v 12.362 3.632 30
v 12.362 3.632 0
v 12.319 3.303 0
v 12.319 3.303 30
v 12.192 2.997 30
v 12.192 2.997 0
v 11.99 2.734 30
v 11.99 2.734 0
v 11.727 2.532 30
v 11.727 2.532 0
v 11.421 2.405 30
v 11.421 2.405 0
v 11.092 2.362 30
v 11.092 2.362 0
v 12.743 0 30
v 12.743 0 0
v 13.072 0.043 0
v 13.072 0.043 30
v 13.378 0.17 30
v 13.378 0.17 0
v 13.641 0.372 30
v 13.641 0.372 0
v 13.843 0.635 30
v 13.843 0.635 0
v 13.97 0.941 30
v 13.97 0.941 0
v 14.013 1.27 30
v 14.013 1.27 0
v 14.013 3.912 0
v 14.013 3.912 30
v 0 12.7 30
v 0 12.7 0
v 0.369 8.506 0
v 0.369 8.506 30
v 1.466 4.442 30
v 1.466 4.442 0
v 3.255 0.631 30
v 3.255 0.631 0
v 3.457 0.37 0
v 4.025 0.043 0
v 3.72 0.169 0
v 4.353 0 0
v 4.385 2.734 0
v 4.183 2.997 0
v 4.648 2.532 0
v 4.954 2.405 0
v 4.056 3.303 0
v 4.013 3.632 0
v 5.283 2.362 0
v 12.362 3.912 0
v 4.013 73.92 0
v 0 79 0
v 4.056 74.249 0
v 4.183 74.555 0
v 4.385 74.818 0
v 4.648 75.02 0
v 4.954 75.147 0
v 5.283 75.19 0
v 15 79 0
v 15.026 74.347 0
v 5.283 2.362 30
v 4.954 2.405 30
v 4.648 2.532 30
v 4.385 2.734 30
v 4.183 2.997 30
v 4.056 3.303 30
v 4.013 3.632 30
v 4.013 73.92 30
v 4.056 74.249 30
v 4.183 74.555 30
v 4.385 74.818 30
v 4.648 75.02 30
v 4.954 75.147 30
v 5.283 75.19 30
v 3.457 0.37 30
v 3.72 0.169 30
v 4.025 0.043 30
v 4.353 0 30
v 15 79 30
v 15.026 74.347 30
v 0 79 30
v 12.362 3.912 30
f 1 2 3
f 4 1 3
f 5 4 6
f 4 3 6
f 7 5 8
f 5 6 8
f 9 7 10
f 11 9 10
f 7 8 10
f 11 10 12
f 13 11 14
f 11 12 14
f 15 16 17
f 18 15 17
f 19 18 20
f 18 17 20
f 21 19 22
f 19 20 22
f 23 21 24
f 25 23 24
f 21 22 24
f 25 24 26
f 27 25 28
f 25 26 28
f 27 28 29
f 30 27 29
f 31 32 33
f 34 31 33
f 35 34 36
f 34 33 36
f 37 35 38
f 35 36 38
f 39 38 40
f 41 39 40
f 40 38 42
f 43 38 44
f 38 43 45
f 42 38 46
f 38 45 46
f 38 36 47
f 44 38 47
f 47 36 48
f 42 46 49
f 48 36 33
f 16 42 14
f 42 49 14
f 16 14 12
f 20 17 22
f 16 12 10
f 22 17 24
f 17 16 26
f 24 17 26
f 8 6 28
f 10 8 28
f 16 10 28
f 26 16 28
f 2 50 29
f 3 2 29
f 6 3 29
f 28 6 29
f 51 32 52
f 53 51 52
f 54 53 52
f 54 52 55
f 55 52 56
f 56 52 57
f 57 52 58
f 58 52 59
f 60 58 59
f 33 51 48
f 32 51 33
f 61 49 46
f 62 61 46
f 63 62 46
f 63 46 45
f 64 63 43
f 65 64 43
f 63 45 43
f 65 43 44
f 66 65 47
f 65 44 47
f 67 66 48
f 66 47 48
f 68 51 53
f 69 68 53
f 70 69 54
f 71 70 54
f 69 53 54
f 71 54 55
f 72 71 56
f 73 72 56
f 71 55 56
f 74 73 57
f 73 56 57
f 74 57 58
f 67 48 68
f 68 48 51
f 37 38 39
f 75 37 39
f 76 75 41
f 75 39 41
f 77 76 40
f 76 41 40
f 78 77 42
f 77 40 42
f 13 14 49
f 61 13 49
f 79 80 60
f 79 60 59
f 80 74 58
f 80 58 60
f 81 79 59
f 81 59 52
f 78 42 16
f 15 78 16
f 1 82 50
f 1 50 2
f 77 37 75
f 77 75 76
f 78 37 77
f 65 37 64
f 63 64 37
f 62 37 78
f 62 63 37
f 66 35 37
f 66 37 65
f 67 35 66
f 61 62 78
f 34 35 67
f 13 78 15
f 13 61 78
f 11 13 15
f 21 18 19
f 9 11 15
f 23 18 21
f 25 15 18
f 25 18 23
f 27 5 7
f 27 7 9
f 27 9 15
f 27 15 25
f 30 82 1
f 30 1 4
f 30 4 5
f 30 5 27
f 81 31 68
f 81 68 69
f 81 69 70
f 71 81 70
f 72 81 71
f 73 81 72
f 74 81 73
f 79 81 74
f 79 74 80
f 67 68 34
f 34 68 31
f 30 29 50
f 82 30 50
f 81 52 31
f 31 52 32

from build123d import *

# Parameters (mm, degrees)
F1_DEPTH = 30


# Not quite as in the source:
# - a feature names something its author has since deleted; it is built from what else it names


with BuildPart() as f1:
    # F0 (on Top) → F1 (new body)
    with BuildSketch(Plane.XY):
        with BuildLine():
            Line((15.0259537622, 74.3470937014), (15, 79))
            Line((15, 79), (0, 79))
            Line((0, 79), (0, 12.7))
            ThreePointArc((0, 12.7), (0.8280772268, 6.4500404007), (3.2551662494, 0.6313682358))
            ThreePointArc((3.2551662494, 0.6313682358), (3.719732188, 0.1690998364), (4.352913702, 0))
            Line((4.352913702, 0), (12.7432, 0))
            ThreePointArc((12.7432, 0), (13.6412256121, 0.3719743879), (14.0132, 1.27))
            Line((14.0132, 1.27), (14.0132, 3.9116))
            Line((14.0132, 3.9116), (12.3622, 3.9116))
            Line((12.3622, 3.9116), (12.3622, 3.6322))
            ThreePointArc((12.3622, 3.6322), (11.9902256121, 2.7341743879), (11.0922, 2.3622))
            Line((11.0922, 2.3622), (5.2832, 2.3622))
            ThreePointArc((5.2832, 2.3622), (4.3851743879, 2.7341743879), (4.0132, 3.6322))
            Line((4.0132, 3.6322), (4.0132, 73.92))
            ThreePointArc((4.0132, 73.92), (4.3851743879, 74.8180256121), (5.2832, 75.19))
            Line((5.2832, 75.19), (15.0259537622, 74.3470937014))
        make_face()
    extrude(amount=F1_DEPTH)


solid = f1.part
